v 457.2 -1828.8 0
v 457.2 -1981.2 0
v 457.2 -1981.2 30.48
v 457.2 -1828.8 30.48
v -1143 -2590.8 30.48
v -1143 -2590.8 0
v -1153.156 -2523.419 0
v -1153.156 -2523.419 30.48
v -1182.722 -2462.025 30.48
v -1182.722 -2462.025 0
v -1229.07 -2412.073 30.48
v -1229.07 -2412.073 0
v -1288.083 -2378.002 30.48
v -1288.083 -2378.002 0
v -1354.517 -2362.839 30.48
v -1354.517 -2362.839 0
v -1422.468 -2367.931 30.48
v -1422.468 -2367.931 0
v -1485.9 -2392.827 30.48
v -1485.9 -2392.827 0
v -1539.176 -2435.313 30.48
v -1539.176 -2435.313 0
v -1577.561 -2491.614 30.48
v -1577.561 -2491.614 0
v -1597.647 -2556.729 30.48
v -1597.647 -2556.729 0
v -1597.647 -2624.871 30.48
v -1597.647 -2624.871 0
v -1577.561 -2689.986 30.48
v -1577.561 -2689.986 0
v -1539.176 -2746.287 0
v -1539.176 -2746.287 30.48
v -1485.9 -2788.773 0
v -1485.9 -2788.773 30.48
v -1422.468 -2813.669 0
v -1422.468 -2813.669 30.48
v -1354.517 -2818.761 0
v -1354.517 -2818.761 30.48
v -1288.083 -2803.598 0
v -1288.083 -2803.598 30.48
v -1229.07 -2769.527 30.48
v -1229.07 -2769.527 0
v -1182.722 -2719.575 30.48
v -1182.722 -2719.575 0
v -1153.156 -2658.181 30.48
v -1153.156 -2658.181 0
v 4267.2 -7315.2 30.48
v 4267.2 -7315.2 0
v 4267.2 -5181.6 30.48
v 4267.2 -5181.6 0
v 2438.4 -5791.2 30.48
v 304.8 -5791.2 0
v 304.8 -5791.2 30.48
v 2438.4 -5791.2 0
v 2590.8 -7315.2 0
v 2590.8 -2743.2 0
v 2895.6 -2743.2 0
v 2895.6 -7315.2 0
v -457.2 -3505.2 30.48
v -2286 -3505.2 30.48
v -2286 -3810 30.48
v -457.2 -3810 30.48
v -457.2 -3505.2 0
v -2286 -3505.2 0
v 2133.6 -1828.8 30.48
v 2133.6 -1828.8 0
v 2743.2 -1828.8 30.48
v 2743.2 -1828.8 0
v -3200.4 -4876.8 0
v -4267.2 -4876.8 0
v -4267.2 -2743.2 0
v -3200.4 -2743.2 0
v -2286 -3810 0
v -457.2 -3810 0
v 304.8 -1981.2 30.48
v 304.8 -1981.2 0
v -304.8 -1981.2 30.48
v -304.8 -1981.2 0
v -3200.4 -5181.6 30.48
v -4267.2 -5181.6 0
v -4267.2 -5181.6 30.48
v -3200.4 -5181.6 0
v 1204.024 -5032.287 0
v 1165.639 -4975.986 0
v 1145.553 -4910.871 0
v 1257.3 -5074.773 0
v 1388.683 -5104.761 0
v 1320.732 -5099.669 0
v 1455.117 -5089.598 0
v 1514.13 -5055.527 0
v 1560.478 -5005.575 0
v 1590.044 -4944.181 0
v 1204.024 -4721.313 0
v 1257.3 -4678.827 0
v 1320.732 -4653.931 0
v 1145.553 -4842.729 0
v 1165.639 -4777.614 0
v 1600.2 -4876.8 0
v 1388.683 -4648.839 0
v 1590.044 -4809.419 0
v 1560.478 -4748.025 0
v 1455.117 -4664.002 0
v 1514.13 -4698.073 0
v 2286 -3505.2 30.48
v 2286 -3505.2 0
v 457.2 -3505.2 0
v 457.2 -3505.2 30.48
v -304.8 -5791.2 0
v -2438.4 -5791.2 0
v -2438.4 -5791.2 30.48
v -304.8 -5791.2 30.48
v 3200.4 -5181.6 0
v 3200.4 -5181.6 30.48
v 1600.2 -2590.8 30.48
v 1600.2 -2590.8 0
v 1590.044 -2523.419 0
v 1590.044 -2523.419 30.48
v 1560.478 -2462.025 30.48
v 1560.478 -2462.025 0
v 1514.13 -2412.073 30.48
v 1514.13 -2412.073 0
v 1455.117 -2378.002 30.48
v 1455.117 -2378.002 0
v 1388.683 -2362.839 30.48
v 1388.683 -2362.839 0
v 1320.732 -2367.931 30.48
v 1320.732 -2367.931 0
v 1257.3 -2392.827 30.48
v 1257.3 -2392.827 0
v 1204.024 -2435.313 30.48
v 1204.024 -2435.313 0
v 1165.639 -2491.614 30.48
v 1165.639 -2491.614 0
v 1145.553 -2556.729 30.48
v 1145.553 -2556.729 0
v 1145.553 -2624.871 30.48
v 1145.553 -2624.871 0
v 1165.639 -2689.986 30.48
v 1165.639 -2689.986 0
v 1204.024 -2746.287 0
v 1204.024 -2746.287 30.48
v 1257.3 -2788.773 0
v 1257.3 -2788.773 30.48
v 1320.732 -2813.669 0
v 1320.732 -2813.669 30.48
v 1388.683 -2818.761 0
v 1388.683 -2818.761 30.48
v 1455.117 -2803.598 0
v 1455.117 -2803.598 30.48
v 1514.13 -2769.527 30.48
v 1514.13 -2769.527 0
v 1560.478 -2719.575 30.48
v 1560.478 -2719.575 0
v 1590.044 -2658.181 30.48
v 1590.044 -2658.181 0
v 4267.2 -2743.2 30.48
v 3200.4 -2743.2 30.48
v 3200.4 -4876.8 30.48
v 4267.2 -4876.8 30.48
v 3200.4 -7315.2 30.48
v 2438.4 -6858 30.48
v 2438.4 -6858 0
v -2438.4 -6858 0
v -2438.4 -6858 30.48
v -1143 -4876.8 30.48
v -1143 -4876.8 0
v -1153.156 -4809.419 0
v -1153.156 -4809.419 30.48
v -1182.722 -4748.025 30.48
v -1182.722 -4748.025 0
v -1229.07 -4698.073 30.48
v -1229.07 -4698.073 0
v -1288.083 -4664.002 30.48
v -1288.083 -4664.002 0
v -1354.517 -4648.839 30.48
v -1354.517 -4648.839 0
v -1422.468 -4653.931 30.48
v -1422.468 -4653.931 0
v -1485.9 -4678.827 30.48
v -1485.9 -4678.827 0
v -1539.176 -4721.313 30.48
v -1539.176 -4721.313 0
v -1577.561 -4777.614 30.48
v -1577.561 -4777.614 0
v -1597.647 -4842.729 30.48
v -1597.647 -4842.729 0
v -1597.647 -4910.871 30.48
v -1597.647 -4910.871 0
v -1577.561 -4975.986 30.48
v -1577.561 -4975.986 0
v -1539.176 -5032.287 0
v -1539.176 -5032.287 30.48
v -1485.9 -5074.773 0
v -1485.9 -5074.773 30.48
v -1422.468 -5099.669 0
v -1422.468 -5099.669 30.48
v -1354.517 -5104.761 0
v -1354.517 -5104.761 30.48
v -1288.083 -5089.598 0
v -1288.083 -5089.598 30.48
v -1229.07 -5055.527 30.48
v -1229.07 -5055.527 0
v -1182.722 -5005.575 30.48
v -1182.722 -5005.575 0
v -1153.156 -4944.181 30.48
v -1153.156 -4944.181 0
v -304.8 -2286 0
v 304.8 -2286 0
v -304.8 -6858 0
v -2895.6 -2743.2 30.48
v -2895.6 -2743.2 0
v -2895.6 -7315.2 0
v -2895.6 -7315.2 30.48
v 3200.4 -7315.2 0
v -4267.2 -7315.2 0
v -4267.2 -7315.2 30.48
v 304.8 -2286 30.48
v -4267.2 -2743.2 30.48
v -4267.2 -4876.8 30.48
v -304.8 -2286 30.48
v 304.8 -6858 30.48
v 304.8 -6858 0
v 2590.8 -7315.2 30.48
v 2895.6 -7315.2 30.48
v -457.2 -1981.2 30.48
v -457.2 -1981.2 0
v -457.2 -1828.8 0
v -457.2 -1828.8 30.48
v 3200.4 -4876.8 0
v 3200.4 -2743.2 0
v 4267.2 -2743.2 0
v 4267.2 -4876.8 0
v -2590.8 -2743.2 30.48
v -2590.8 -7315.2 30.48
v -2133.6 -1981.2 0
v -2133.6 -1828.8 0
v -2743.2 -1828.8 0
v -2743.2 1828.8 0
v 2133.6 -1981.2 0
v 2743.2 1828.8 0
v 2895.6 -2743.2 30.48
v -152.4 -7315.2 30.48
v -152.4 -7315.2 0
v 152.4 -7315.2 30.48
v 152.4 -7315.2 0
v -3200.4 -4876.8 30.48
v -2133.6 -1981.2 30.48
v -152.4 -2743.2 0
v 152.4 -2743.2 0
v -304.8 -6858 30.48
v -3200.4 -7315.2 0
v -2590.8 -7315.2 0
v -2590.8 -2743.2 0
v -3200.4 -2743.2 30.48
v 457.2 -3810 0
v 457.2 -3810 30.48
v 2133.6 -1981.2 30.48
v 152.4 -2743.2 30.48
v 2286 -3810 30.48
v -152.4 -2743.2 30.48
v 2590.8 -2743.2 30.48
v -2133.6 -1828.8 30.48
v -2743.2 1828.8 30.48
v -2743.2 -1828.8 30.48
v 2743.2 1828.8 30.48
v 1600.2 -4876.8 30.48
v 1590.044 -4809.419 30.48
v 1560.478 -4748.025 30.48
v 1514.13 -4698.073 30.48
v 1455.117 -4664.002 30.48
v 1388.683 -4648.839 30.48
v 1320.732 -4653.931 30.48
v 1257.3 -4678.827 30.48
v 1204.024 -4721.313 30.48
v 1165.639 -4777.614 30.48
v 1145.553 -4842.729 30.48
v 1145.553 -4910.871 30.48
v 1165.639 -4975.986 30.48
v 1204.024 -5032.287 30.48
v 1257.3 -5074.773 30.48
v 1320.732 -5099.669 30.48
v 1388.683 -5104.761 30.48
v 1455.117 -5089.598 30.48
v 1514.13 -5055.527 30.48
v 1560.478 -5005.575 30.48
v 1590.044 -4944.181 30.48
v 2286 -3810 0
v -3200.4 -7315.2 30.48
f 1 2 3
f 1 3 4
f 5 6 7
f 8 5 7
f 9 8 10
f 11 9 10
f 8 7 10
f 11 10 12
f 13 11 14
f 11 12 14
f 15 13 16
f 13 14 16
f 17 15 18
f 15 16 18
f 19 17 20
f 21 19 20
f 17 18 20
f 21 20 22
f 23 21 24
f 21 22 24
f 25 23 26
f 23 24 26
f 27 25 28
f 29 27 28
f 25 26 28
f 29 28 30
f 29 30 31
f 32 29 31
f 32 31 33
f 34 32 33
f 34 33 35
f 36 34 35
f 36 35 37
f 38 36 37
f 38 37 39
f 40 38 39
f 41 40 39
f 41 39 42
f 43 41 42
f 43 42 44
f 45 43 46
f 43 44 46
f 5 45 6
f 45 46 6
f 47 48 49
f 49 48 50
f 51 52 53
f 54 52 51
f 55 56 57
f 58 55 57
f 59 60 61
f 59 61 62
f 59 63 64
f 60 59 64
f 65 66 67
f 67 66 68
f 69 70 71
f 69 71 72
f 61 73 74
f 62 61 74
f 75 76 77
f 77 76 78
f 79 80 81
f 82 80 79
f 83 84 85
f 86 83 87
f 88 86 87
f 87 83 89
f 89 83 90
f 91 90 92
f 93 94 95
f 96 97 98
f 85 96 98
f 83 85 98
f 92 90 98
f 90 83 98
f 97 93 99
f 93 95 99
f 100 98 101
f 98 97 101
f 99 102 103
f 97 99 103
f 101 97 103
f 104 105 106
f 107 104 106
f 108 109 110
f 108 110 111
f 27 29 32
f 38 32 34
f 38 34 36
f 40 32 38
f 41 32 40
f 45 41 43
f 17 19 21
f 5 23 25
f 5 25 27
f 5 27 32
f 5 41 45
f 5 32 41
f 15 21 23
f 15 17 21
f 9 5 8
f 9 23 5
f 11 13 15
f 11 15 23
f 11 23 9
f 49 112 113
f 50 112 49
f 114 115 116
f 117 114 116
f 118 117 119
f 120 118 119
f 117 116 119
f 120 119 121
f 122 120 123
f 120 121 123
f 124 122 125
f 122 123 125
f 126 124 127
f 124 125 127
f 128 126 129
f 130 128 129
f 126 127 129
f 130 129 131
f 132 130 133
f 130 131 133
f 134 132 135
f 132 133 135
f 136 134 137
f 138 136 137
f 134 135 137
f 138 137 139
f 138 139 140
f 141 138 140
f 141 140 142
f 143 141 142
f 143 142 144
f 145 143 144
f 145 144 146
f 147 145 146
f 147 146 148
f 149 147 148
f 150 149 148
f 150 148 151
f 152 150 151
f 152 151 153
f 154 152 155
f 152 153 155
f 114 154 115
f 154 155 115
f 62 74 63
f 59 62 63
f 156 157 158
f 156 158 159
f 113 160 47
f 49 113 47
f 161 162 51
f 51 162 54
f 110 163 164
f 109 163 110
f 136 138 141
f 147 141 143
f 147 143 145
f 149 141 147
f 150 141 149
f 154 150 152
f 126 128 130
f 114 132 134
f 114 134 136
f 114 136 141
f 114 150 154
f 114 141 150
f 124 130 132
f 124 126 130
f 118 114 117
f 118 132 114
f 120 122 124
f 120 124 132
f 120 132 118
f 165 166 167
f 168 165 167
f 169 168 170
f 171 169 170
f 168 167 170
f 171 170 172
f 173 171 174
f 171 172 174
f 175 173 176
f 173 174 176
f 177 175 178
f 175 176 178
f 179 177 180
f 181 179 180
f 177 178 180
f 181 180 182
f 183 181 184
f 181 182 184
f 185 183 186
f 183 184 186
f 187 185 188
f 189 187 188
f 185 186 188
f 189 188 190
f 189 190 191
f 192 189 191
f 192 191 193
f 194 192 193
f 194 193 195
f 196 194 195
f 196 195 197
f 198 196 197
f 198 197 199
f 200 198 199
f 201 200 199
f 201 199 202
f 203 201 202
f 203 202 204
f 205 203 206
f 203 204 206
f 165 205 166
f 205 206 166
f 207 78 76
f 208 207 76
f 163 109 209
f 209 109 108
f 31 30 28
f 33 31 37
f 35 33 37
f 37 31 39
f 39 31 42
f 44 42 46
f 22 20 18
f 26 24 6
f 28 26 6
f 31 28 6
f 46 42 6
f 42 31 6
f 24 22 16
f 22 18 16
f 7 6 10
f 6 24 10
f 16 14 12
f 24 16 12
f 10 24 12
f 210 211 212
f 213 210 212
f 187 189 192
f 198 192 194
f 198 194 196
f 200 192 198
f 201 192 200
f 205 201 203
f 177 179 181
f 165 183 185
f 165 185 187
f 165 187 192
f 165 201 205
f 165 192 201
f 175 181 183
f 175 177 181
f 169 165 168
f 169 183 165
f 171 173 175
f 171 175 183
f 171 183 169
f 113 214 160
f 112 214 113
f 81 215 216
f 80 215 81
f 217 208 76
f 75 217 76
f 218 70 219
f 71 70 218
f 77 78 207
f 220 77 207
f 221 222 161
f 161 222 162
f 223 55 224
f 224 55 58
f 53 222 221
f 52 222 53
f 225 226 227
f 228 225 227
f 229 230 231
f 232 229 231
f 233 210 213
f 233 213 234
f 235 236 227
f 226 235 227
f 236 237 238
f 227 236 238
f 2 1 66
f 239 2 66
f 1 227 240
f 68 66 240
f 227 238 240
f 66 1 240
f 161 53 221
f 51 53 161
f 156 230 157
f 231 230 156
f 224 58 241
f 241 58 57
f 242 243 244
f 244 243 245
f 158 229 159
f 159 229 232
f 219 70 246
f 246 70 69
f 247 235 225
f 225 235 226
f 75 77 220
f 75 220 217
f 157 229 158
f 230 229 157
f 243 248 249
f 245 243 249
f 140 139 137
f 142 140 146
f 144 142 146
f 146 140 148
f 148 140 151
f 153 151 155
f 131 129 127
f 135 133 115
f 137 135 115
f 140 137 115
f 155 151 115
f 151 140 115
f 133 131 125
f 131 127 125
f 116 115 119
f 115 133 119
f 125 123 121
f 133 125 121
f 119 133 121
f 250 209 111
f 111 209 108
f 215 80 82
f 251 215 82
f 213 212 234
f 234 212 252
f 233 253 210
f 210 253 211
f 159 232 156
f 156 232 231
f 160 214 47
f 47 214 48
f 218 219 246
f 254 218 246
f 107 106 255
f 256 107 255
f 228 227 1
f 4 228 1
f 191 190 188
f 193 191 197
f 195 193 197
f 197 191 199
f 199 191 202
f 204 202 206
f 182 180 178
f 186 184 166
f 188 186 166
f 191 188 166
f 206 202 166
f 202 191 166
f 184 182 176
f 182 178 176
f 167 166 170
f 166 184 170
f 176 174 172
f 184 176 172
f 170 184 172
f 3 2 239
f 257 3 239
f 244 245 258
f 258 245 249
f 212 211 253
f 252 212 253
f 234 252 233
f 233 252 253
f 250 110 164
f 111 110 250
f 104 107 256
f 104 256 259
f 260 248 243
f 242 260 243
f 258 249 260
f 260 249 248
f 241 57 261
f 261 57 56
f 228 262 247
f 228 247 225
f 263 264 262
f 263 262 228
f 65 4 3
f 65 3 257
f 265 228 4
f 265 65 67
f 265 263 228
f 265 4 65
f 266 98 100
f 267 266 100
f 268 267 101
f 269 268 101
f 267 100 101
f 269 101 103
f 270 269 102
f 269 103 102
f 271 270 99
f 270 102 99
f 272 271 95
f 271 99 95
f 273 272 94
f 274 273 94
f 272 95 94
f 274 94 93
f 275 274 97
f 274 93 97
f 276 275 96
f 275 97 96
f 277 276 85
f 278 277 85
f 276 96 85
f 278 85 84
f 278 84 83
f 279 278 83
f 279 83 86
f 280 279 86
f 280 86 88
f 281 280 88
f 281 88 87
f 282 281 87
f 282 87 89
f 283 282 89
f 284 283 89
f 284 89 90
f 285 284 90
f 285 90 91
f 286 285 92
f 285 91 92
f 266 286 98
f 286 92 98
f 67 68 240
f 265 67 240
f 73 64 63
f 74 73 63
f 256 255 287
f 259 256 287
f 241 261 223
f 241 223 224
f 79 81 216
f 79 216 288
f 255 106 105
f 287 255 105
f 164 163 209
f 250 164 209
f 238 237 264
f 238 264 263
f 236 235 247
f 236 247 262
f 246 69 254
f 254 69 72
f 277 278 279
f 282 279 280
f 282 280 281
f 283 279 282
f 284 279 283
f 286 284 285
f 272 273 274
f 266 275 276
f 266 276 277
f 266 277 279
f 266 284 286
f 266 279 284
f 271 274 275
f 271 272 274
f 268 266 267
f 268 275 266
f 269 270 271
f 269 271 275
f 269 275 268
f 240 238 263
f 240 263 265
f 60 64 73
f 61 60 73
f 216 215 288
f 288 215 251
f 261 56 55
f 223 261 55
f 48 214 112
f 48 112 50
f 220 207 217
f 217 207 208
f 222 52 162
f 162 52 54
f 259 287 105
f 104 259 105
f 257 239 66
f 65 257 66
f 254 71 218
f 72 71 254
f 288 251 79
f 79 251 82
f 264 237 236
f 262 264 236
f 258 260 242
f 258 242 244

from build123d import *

# Parameters (mm, degrees)
F0_W      = 5486.4
F0_H      = 3657.6
F1_DEPTH  = 30.48
F3_DEPTH  = 30.48
F4_W      = 1066.8
F4_H      = 2133.6
F5_DEPTH  = 30.48
F7_DEPTH  = 30.48
F8_W      = 1676.4
F8_H      = 152.4
F9_DEPTH  = 30.48
F11_DEPTH = 30.48
F12_W     = 2133.6
F12_H     = 1066.8
F13_DEPTH = 30.48
F14_R     = 228.6
F15_DEPTH = 30.48


with BuildPart() as f1:
    # F0 (on Top) → F1 (new body)
    with BuildSketch(Plane.XY):
        Rectangle(F0_W, F0_H)
    extrude(amount=F1_DEPTH)

    # F8 (on Top) → F9 (join)
    with BuildSketch(Plane.XY):
        with Locations((1295.4, -1905)):
            Rectangle(F8_W, F8_H)
        with Locations((-1295.4, -1905)):
            Rectangle(F8_W, F8_H)
    extrude(amount=F9_DEPTH)


with BuildPart() as f3:
    # F2 (on Top) → F3 (new body)
    with BuildSketch(Plane.XY):
        Polygon((152.4, -2743.2), (0, -2743.2), (-152.4, -2743.2), (-152.4, -7315.2), (152.4, -7315.2), align=None)
        Polygon((2895.6, -2743.2), (2743.2, -2743.2), (2590.8, -2743.2), (2590.8, -7315.2), (2895.6, -7315.2), align=None)
        Polygon((-2590.8, -2743.2), (-2743.2, -2743.2), (-2895.6, -2743.2), (-2895.6, -7315.2), (-2590.8, -7315.2), align=None)
    extrude(amount=F3_DEPTH)


with BuildPart() as f5:
    # F4 (on Top) → F5 (new body)
    with BuildSketch(Plane.XY):
        with Locations((-3733.8, -6248.4)):
            Rectangle(F4_W, F4_H)
        with Locations((-3733.8, -3810)):
            Rectangle(F4_W, F4_H)
        with Locations((3733.8, -3810)):
            Rectangle(F4_W, F4_H)
        with Locations((3733.8, -6248.4)):
            Rectangle(F4_W, F4_H)
    extrude(amount=F5_DEPTH)


with BuildPart() as f7:
    # F6 (on Top) → F7 (new body)
    with BuildSketch(Plane.XY):
        Polygon((304.8, -1981.2), (0, -1981.2), (-304.8, -1981.2), (-304.8, -2286), (304.8, -2286), align=None)
    extrude(amount=F7_DEPTH)


with BuildPart() as f11:
    # F10 (on Top) → F11 (new body)
    with BuildSketch(Plane.XY):
        Polygon((457.2, -3505.2), (457.2, -3657.6), (457.2, -3810), (2286, -3810), (2286, -3505.2), align=None)
        Polygon((-457.2, -3810), (-457.2, -3657.6), (-457.2, -3505.2), (-2286, -3505.2), (-2286, -3810), align=None)
    extrude(amount=F11_DEPTH)


with BuildPart() as f13:
    # F12 (on Top) → F13 (new body)
    with BuildSketch(Plane.XY):
        with Locations((-1371.6, -6324.6)):
            Rectangle(F12_W, F12_H)
        with Locations((1371.6, -6324.6)):
            Rectangle(F12_W, F12_H)
    extrude(amount=F13_DEPTH)


with BuildPart() as f15:
    # F14 (on Top) → F15 (new body)
    with BuildSketch(Plane.XY):
        with Locations((-1371.6, -2590.8)):
            Circle(F14_R)
        with Locations((1371.6, -2590.8)):
            Circle(F14_R)
        with Locations((1371.6, -4876.8)):
            Circle(F14_R)
        with Locations((-1371.6, -4876.8)):
            Circle(F14_R)
    extrude(amount=F15_DEPTH)


solid = Compound([f1.part, f3.part, f5.part, f7.part, f11.part, f13.part, f15.part])
